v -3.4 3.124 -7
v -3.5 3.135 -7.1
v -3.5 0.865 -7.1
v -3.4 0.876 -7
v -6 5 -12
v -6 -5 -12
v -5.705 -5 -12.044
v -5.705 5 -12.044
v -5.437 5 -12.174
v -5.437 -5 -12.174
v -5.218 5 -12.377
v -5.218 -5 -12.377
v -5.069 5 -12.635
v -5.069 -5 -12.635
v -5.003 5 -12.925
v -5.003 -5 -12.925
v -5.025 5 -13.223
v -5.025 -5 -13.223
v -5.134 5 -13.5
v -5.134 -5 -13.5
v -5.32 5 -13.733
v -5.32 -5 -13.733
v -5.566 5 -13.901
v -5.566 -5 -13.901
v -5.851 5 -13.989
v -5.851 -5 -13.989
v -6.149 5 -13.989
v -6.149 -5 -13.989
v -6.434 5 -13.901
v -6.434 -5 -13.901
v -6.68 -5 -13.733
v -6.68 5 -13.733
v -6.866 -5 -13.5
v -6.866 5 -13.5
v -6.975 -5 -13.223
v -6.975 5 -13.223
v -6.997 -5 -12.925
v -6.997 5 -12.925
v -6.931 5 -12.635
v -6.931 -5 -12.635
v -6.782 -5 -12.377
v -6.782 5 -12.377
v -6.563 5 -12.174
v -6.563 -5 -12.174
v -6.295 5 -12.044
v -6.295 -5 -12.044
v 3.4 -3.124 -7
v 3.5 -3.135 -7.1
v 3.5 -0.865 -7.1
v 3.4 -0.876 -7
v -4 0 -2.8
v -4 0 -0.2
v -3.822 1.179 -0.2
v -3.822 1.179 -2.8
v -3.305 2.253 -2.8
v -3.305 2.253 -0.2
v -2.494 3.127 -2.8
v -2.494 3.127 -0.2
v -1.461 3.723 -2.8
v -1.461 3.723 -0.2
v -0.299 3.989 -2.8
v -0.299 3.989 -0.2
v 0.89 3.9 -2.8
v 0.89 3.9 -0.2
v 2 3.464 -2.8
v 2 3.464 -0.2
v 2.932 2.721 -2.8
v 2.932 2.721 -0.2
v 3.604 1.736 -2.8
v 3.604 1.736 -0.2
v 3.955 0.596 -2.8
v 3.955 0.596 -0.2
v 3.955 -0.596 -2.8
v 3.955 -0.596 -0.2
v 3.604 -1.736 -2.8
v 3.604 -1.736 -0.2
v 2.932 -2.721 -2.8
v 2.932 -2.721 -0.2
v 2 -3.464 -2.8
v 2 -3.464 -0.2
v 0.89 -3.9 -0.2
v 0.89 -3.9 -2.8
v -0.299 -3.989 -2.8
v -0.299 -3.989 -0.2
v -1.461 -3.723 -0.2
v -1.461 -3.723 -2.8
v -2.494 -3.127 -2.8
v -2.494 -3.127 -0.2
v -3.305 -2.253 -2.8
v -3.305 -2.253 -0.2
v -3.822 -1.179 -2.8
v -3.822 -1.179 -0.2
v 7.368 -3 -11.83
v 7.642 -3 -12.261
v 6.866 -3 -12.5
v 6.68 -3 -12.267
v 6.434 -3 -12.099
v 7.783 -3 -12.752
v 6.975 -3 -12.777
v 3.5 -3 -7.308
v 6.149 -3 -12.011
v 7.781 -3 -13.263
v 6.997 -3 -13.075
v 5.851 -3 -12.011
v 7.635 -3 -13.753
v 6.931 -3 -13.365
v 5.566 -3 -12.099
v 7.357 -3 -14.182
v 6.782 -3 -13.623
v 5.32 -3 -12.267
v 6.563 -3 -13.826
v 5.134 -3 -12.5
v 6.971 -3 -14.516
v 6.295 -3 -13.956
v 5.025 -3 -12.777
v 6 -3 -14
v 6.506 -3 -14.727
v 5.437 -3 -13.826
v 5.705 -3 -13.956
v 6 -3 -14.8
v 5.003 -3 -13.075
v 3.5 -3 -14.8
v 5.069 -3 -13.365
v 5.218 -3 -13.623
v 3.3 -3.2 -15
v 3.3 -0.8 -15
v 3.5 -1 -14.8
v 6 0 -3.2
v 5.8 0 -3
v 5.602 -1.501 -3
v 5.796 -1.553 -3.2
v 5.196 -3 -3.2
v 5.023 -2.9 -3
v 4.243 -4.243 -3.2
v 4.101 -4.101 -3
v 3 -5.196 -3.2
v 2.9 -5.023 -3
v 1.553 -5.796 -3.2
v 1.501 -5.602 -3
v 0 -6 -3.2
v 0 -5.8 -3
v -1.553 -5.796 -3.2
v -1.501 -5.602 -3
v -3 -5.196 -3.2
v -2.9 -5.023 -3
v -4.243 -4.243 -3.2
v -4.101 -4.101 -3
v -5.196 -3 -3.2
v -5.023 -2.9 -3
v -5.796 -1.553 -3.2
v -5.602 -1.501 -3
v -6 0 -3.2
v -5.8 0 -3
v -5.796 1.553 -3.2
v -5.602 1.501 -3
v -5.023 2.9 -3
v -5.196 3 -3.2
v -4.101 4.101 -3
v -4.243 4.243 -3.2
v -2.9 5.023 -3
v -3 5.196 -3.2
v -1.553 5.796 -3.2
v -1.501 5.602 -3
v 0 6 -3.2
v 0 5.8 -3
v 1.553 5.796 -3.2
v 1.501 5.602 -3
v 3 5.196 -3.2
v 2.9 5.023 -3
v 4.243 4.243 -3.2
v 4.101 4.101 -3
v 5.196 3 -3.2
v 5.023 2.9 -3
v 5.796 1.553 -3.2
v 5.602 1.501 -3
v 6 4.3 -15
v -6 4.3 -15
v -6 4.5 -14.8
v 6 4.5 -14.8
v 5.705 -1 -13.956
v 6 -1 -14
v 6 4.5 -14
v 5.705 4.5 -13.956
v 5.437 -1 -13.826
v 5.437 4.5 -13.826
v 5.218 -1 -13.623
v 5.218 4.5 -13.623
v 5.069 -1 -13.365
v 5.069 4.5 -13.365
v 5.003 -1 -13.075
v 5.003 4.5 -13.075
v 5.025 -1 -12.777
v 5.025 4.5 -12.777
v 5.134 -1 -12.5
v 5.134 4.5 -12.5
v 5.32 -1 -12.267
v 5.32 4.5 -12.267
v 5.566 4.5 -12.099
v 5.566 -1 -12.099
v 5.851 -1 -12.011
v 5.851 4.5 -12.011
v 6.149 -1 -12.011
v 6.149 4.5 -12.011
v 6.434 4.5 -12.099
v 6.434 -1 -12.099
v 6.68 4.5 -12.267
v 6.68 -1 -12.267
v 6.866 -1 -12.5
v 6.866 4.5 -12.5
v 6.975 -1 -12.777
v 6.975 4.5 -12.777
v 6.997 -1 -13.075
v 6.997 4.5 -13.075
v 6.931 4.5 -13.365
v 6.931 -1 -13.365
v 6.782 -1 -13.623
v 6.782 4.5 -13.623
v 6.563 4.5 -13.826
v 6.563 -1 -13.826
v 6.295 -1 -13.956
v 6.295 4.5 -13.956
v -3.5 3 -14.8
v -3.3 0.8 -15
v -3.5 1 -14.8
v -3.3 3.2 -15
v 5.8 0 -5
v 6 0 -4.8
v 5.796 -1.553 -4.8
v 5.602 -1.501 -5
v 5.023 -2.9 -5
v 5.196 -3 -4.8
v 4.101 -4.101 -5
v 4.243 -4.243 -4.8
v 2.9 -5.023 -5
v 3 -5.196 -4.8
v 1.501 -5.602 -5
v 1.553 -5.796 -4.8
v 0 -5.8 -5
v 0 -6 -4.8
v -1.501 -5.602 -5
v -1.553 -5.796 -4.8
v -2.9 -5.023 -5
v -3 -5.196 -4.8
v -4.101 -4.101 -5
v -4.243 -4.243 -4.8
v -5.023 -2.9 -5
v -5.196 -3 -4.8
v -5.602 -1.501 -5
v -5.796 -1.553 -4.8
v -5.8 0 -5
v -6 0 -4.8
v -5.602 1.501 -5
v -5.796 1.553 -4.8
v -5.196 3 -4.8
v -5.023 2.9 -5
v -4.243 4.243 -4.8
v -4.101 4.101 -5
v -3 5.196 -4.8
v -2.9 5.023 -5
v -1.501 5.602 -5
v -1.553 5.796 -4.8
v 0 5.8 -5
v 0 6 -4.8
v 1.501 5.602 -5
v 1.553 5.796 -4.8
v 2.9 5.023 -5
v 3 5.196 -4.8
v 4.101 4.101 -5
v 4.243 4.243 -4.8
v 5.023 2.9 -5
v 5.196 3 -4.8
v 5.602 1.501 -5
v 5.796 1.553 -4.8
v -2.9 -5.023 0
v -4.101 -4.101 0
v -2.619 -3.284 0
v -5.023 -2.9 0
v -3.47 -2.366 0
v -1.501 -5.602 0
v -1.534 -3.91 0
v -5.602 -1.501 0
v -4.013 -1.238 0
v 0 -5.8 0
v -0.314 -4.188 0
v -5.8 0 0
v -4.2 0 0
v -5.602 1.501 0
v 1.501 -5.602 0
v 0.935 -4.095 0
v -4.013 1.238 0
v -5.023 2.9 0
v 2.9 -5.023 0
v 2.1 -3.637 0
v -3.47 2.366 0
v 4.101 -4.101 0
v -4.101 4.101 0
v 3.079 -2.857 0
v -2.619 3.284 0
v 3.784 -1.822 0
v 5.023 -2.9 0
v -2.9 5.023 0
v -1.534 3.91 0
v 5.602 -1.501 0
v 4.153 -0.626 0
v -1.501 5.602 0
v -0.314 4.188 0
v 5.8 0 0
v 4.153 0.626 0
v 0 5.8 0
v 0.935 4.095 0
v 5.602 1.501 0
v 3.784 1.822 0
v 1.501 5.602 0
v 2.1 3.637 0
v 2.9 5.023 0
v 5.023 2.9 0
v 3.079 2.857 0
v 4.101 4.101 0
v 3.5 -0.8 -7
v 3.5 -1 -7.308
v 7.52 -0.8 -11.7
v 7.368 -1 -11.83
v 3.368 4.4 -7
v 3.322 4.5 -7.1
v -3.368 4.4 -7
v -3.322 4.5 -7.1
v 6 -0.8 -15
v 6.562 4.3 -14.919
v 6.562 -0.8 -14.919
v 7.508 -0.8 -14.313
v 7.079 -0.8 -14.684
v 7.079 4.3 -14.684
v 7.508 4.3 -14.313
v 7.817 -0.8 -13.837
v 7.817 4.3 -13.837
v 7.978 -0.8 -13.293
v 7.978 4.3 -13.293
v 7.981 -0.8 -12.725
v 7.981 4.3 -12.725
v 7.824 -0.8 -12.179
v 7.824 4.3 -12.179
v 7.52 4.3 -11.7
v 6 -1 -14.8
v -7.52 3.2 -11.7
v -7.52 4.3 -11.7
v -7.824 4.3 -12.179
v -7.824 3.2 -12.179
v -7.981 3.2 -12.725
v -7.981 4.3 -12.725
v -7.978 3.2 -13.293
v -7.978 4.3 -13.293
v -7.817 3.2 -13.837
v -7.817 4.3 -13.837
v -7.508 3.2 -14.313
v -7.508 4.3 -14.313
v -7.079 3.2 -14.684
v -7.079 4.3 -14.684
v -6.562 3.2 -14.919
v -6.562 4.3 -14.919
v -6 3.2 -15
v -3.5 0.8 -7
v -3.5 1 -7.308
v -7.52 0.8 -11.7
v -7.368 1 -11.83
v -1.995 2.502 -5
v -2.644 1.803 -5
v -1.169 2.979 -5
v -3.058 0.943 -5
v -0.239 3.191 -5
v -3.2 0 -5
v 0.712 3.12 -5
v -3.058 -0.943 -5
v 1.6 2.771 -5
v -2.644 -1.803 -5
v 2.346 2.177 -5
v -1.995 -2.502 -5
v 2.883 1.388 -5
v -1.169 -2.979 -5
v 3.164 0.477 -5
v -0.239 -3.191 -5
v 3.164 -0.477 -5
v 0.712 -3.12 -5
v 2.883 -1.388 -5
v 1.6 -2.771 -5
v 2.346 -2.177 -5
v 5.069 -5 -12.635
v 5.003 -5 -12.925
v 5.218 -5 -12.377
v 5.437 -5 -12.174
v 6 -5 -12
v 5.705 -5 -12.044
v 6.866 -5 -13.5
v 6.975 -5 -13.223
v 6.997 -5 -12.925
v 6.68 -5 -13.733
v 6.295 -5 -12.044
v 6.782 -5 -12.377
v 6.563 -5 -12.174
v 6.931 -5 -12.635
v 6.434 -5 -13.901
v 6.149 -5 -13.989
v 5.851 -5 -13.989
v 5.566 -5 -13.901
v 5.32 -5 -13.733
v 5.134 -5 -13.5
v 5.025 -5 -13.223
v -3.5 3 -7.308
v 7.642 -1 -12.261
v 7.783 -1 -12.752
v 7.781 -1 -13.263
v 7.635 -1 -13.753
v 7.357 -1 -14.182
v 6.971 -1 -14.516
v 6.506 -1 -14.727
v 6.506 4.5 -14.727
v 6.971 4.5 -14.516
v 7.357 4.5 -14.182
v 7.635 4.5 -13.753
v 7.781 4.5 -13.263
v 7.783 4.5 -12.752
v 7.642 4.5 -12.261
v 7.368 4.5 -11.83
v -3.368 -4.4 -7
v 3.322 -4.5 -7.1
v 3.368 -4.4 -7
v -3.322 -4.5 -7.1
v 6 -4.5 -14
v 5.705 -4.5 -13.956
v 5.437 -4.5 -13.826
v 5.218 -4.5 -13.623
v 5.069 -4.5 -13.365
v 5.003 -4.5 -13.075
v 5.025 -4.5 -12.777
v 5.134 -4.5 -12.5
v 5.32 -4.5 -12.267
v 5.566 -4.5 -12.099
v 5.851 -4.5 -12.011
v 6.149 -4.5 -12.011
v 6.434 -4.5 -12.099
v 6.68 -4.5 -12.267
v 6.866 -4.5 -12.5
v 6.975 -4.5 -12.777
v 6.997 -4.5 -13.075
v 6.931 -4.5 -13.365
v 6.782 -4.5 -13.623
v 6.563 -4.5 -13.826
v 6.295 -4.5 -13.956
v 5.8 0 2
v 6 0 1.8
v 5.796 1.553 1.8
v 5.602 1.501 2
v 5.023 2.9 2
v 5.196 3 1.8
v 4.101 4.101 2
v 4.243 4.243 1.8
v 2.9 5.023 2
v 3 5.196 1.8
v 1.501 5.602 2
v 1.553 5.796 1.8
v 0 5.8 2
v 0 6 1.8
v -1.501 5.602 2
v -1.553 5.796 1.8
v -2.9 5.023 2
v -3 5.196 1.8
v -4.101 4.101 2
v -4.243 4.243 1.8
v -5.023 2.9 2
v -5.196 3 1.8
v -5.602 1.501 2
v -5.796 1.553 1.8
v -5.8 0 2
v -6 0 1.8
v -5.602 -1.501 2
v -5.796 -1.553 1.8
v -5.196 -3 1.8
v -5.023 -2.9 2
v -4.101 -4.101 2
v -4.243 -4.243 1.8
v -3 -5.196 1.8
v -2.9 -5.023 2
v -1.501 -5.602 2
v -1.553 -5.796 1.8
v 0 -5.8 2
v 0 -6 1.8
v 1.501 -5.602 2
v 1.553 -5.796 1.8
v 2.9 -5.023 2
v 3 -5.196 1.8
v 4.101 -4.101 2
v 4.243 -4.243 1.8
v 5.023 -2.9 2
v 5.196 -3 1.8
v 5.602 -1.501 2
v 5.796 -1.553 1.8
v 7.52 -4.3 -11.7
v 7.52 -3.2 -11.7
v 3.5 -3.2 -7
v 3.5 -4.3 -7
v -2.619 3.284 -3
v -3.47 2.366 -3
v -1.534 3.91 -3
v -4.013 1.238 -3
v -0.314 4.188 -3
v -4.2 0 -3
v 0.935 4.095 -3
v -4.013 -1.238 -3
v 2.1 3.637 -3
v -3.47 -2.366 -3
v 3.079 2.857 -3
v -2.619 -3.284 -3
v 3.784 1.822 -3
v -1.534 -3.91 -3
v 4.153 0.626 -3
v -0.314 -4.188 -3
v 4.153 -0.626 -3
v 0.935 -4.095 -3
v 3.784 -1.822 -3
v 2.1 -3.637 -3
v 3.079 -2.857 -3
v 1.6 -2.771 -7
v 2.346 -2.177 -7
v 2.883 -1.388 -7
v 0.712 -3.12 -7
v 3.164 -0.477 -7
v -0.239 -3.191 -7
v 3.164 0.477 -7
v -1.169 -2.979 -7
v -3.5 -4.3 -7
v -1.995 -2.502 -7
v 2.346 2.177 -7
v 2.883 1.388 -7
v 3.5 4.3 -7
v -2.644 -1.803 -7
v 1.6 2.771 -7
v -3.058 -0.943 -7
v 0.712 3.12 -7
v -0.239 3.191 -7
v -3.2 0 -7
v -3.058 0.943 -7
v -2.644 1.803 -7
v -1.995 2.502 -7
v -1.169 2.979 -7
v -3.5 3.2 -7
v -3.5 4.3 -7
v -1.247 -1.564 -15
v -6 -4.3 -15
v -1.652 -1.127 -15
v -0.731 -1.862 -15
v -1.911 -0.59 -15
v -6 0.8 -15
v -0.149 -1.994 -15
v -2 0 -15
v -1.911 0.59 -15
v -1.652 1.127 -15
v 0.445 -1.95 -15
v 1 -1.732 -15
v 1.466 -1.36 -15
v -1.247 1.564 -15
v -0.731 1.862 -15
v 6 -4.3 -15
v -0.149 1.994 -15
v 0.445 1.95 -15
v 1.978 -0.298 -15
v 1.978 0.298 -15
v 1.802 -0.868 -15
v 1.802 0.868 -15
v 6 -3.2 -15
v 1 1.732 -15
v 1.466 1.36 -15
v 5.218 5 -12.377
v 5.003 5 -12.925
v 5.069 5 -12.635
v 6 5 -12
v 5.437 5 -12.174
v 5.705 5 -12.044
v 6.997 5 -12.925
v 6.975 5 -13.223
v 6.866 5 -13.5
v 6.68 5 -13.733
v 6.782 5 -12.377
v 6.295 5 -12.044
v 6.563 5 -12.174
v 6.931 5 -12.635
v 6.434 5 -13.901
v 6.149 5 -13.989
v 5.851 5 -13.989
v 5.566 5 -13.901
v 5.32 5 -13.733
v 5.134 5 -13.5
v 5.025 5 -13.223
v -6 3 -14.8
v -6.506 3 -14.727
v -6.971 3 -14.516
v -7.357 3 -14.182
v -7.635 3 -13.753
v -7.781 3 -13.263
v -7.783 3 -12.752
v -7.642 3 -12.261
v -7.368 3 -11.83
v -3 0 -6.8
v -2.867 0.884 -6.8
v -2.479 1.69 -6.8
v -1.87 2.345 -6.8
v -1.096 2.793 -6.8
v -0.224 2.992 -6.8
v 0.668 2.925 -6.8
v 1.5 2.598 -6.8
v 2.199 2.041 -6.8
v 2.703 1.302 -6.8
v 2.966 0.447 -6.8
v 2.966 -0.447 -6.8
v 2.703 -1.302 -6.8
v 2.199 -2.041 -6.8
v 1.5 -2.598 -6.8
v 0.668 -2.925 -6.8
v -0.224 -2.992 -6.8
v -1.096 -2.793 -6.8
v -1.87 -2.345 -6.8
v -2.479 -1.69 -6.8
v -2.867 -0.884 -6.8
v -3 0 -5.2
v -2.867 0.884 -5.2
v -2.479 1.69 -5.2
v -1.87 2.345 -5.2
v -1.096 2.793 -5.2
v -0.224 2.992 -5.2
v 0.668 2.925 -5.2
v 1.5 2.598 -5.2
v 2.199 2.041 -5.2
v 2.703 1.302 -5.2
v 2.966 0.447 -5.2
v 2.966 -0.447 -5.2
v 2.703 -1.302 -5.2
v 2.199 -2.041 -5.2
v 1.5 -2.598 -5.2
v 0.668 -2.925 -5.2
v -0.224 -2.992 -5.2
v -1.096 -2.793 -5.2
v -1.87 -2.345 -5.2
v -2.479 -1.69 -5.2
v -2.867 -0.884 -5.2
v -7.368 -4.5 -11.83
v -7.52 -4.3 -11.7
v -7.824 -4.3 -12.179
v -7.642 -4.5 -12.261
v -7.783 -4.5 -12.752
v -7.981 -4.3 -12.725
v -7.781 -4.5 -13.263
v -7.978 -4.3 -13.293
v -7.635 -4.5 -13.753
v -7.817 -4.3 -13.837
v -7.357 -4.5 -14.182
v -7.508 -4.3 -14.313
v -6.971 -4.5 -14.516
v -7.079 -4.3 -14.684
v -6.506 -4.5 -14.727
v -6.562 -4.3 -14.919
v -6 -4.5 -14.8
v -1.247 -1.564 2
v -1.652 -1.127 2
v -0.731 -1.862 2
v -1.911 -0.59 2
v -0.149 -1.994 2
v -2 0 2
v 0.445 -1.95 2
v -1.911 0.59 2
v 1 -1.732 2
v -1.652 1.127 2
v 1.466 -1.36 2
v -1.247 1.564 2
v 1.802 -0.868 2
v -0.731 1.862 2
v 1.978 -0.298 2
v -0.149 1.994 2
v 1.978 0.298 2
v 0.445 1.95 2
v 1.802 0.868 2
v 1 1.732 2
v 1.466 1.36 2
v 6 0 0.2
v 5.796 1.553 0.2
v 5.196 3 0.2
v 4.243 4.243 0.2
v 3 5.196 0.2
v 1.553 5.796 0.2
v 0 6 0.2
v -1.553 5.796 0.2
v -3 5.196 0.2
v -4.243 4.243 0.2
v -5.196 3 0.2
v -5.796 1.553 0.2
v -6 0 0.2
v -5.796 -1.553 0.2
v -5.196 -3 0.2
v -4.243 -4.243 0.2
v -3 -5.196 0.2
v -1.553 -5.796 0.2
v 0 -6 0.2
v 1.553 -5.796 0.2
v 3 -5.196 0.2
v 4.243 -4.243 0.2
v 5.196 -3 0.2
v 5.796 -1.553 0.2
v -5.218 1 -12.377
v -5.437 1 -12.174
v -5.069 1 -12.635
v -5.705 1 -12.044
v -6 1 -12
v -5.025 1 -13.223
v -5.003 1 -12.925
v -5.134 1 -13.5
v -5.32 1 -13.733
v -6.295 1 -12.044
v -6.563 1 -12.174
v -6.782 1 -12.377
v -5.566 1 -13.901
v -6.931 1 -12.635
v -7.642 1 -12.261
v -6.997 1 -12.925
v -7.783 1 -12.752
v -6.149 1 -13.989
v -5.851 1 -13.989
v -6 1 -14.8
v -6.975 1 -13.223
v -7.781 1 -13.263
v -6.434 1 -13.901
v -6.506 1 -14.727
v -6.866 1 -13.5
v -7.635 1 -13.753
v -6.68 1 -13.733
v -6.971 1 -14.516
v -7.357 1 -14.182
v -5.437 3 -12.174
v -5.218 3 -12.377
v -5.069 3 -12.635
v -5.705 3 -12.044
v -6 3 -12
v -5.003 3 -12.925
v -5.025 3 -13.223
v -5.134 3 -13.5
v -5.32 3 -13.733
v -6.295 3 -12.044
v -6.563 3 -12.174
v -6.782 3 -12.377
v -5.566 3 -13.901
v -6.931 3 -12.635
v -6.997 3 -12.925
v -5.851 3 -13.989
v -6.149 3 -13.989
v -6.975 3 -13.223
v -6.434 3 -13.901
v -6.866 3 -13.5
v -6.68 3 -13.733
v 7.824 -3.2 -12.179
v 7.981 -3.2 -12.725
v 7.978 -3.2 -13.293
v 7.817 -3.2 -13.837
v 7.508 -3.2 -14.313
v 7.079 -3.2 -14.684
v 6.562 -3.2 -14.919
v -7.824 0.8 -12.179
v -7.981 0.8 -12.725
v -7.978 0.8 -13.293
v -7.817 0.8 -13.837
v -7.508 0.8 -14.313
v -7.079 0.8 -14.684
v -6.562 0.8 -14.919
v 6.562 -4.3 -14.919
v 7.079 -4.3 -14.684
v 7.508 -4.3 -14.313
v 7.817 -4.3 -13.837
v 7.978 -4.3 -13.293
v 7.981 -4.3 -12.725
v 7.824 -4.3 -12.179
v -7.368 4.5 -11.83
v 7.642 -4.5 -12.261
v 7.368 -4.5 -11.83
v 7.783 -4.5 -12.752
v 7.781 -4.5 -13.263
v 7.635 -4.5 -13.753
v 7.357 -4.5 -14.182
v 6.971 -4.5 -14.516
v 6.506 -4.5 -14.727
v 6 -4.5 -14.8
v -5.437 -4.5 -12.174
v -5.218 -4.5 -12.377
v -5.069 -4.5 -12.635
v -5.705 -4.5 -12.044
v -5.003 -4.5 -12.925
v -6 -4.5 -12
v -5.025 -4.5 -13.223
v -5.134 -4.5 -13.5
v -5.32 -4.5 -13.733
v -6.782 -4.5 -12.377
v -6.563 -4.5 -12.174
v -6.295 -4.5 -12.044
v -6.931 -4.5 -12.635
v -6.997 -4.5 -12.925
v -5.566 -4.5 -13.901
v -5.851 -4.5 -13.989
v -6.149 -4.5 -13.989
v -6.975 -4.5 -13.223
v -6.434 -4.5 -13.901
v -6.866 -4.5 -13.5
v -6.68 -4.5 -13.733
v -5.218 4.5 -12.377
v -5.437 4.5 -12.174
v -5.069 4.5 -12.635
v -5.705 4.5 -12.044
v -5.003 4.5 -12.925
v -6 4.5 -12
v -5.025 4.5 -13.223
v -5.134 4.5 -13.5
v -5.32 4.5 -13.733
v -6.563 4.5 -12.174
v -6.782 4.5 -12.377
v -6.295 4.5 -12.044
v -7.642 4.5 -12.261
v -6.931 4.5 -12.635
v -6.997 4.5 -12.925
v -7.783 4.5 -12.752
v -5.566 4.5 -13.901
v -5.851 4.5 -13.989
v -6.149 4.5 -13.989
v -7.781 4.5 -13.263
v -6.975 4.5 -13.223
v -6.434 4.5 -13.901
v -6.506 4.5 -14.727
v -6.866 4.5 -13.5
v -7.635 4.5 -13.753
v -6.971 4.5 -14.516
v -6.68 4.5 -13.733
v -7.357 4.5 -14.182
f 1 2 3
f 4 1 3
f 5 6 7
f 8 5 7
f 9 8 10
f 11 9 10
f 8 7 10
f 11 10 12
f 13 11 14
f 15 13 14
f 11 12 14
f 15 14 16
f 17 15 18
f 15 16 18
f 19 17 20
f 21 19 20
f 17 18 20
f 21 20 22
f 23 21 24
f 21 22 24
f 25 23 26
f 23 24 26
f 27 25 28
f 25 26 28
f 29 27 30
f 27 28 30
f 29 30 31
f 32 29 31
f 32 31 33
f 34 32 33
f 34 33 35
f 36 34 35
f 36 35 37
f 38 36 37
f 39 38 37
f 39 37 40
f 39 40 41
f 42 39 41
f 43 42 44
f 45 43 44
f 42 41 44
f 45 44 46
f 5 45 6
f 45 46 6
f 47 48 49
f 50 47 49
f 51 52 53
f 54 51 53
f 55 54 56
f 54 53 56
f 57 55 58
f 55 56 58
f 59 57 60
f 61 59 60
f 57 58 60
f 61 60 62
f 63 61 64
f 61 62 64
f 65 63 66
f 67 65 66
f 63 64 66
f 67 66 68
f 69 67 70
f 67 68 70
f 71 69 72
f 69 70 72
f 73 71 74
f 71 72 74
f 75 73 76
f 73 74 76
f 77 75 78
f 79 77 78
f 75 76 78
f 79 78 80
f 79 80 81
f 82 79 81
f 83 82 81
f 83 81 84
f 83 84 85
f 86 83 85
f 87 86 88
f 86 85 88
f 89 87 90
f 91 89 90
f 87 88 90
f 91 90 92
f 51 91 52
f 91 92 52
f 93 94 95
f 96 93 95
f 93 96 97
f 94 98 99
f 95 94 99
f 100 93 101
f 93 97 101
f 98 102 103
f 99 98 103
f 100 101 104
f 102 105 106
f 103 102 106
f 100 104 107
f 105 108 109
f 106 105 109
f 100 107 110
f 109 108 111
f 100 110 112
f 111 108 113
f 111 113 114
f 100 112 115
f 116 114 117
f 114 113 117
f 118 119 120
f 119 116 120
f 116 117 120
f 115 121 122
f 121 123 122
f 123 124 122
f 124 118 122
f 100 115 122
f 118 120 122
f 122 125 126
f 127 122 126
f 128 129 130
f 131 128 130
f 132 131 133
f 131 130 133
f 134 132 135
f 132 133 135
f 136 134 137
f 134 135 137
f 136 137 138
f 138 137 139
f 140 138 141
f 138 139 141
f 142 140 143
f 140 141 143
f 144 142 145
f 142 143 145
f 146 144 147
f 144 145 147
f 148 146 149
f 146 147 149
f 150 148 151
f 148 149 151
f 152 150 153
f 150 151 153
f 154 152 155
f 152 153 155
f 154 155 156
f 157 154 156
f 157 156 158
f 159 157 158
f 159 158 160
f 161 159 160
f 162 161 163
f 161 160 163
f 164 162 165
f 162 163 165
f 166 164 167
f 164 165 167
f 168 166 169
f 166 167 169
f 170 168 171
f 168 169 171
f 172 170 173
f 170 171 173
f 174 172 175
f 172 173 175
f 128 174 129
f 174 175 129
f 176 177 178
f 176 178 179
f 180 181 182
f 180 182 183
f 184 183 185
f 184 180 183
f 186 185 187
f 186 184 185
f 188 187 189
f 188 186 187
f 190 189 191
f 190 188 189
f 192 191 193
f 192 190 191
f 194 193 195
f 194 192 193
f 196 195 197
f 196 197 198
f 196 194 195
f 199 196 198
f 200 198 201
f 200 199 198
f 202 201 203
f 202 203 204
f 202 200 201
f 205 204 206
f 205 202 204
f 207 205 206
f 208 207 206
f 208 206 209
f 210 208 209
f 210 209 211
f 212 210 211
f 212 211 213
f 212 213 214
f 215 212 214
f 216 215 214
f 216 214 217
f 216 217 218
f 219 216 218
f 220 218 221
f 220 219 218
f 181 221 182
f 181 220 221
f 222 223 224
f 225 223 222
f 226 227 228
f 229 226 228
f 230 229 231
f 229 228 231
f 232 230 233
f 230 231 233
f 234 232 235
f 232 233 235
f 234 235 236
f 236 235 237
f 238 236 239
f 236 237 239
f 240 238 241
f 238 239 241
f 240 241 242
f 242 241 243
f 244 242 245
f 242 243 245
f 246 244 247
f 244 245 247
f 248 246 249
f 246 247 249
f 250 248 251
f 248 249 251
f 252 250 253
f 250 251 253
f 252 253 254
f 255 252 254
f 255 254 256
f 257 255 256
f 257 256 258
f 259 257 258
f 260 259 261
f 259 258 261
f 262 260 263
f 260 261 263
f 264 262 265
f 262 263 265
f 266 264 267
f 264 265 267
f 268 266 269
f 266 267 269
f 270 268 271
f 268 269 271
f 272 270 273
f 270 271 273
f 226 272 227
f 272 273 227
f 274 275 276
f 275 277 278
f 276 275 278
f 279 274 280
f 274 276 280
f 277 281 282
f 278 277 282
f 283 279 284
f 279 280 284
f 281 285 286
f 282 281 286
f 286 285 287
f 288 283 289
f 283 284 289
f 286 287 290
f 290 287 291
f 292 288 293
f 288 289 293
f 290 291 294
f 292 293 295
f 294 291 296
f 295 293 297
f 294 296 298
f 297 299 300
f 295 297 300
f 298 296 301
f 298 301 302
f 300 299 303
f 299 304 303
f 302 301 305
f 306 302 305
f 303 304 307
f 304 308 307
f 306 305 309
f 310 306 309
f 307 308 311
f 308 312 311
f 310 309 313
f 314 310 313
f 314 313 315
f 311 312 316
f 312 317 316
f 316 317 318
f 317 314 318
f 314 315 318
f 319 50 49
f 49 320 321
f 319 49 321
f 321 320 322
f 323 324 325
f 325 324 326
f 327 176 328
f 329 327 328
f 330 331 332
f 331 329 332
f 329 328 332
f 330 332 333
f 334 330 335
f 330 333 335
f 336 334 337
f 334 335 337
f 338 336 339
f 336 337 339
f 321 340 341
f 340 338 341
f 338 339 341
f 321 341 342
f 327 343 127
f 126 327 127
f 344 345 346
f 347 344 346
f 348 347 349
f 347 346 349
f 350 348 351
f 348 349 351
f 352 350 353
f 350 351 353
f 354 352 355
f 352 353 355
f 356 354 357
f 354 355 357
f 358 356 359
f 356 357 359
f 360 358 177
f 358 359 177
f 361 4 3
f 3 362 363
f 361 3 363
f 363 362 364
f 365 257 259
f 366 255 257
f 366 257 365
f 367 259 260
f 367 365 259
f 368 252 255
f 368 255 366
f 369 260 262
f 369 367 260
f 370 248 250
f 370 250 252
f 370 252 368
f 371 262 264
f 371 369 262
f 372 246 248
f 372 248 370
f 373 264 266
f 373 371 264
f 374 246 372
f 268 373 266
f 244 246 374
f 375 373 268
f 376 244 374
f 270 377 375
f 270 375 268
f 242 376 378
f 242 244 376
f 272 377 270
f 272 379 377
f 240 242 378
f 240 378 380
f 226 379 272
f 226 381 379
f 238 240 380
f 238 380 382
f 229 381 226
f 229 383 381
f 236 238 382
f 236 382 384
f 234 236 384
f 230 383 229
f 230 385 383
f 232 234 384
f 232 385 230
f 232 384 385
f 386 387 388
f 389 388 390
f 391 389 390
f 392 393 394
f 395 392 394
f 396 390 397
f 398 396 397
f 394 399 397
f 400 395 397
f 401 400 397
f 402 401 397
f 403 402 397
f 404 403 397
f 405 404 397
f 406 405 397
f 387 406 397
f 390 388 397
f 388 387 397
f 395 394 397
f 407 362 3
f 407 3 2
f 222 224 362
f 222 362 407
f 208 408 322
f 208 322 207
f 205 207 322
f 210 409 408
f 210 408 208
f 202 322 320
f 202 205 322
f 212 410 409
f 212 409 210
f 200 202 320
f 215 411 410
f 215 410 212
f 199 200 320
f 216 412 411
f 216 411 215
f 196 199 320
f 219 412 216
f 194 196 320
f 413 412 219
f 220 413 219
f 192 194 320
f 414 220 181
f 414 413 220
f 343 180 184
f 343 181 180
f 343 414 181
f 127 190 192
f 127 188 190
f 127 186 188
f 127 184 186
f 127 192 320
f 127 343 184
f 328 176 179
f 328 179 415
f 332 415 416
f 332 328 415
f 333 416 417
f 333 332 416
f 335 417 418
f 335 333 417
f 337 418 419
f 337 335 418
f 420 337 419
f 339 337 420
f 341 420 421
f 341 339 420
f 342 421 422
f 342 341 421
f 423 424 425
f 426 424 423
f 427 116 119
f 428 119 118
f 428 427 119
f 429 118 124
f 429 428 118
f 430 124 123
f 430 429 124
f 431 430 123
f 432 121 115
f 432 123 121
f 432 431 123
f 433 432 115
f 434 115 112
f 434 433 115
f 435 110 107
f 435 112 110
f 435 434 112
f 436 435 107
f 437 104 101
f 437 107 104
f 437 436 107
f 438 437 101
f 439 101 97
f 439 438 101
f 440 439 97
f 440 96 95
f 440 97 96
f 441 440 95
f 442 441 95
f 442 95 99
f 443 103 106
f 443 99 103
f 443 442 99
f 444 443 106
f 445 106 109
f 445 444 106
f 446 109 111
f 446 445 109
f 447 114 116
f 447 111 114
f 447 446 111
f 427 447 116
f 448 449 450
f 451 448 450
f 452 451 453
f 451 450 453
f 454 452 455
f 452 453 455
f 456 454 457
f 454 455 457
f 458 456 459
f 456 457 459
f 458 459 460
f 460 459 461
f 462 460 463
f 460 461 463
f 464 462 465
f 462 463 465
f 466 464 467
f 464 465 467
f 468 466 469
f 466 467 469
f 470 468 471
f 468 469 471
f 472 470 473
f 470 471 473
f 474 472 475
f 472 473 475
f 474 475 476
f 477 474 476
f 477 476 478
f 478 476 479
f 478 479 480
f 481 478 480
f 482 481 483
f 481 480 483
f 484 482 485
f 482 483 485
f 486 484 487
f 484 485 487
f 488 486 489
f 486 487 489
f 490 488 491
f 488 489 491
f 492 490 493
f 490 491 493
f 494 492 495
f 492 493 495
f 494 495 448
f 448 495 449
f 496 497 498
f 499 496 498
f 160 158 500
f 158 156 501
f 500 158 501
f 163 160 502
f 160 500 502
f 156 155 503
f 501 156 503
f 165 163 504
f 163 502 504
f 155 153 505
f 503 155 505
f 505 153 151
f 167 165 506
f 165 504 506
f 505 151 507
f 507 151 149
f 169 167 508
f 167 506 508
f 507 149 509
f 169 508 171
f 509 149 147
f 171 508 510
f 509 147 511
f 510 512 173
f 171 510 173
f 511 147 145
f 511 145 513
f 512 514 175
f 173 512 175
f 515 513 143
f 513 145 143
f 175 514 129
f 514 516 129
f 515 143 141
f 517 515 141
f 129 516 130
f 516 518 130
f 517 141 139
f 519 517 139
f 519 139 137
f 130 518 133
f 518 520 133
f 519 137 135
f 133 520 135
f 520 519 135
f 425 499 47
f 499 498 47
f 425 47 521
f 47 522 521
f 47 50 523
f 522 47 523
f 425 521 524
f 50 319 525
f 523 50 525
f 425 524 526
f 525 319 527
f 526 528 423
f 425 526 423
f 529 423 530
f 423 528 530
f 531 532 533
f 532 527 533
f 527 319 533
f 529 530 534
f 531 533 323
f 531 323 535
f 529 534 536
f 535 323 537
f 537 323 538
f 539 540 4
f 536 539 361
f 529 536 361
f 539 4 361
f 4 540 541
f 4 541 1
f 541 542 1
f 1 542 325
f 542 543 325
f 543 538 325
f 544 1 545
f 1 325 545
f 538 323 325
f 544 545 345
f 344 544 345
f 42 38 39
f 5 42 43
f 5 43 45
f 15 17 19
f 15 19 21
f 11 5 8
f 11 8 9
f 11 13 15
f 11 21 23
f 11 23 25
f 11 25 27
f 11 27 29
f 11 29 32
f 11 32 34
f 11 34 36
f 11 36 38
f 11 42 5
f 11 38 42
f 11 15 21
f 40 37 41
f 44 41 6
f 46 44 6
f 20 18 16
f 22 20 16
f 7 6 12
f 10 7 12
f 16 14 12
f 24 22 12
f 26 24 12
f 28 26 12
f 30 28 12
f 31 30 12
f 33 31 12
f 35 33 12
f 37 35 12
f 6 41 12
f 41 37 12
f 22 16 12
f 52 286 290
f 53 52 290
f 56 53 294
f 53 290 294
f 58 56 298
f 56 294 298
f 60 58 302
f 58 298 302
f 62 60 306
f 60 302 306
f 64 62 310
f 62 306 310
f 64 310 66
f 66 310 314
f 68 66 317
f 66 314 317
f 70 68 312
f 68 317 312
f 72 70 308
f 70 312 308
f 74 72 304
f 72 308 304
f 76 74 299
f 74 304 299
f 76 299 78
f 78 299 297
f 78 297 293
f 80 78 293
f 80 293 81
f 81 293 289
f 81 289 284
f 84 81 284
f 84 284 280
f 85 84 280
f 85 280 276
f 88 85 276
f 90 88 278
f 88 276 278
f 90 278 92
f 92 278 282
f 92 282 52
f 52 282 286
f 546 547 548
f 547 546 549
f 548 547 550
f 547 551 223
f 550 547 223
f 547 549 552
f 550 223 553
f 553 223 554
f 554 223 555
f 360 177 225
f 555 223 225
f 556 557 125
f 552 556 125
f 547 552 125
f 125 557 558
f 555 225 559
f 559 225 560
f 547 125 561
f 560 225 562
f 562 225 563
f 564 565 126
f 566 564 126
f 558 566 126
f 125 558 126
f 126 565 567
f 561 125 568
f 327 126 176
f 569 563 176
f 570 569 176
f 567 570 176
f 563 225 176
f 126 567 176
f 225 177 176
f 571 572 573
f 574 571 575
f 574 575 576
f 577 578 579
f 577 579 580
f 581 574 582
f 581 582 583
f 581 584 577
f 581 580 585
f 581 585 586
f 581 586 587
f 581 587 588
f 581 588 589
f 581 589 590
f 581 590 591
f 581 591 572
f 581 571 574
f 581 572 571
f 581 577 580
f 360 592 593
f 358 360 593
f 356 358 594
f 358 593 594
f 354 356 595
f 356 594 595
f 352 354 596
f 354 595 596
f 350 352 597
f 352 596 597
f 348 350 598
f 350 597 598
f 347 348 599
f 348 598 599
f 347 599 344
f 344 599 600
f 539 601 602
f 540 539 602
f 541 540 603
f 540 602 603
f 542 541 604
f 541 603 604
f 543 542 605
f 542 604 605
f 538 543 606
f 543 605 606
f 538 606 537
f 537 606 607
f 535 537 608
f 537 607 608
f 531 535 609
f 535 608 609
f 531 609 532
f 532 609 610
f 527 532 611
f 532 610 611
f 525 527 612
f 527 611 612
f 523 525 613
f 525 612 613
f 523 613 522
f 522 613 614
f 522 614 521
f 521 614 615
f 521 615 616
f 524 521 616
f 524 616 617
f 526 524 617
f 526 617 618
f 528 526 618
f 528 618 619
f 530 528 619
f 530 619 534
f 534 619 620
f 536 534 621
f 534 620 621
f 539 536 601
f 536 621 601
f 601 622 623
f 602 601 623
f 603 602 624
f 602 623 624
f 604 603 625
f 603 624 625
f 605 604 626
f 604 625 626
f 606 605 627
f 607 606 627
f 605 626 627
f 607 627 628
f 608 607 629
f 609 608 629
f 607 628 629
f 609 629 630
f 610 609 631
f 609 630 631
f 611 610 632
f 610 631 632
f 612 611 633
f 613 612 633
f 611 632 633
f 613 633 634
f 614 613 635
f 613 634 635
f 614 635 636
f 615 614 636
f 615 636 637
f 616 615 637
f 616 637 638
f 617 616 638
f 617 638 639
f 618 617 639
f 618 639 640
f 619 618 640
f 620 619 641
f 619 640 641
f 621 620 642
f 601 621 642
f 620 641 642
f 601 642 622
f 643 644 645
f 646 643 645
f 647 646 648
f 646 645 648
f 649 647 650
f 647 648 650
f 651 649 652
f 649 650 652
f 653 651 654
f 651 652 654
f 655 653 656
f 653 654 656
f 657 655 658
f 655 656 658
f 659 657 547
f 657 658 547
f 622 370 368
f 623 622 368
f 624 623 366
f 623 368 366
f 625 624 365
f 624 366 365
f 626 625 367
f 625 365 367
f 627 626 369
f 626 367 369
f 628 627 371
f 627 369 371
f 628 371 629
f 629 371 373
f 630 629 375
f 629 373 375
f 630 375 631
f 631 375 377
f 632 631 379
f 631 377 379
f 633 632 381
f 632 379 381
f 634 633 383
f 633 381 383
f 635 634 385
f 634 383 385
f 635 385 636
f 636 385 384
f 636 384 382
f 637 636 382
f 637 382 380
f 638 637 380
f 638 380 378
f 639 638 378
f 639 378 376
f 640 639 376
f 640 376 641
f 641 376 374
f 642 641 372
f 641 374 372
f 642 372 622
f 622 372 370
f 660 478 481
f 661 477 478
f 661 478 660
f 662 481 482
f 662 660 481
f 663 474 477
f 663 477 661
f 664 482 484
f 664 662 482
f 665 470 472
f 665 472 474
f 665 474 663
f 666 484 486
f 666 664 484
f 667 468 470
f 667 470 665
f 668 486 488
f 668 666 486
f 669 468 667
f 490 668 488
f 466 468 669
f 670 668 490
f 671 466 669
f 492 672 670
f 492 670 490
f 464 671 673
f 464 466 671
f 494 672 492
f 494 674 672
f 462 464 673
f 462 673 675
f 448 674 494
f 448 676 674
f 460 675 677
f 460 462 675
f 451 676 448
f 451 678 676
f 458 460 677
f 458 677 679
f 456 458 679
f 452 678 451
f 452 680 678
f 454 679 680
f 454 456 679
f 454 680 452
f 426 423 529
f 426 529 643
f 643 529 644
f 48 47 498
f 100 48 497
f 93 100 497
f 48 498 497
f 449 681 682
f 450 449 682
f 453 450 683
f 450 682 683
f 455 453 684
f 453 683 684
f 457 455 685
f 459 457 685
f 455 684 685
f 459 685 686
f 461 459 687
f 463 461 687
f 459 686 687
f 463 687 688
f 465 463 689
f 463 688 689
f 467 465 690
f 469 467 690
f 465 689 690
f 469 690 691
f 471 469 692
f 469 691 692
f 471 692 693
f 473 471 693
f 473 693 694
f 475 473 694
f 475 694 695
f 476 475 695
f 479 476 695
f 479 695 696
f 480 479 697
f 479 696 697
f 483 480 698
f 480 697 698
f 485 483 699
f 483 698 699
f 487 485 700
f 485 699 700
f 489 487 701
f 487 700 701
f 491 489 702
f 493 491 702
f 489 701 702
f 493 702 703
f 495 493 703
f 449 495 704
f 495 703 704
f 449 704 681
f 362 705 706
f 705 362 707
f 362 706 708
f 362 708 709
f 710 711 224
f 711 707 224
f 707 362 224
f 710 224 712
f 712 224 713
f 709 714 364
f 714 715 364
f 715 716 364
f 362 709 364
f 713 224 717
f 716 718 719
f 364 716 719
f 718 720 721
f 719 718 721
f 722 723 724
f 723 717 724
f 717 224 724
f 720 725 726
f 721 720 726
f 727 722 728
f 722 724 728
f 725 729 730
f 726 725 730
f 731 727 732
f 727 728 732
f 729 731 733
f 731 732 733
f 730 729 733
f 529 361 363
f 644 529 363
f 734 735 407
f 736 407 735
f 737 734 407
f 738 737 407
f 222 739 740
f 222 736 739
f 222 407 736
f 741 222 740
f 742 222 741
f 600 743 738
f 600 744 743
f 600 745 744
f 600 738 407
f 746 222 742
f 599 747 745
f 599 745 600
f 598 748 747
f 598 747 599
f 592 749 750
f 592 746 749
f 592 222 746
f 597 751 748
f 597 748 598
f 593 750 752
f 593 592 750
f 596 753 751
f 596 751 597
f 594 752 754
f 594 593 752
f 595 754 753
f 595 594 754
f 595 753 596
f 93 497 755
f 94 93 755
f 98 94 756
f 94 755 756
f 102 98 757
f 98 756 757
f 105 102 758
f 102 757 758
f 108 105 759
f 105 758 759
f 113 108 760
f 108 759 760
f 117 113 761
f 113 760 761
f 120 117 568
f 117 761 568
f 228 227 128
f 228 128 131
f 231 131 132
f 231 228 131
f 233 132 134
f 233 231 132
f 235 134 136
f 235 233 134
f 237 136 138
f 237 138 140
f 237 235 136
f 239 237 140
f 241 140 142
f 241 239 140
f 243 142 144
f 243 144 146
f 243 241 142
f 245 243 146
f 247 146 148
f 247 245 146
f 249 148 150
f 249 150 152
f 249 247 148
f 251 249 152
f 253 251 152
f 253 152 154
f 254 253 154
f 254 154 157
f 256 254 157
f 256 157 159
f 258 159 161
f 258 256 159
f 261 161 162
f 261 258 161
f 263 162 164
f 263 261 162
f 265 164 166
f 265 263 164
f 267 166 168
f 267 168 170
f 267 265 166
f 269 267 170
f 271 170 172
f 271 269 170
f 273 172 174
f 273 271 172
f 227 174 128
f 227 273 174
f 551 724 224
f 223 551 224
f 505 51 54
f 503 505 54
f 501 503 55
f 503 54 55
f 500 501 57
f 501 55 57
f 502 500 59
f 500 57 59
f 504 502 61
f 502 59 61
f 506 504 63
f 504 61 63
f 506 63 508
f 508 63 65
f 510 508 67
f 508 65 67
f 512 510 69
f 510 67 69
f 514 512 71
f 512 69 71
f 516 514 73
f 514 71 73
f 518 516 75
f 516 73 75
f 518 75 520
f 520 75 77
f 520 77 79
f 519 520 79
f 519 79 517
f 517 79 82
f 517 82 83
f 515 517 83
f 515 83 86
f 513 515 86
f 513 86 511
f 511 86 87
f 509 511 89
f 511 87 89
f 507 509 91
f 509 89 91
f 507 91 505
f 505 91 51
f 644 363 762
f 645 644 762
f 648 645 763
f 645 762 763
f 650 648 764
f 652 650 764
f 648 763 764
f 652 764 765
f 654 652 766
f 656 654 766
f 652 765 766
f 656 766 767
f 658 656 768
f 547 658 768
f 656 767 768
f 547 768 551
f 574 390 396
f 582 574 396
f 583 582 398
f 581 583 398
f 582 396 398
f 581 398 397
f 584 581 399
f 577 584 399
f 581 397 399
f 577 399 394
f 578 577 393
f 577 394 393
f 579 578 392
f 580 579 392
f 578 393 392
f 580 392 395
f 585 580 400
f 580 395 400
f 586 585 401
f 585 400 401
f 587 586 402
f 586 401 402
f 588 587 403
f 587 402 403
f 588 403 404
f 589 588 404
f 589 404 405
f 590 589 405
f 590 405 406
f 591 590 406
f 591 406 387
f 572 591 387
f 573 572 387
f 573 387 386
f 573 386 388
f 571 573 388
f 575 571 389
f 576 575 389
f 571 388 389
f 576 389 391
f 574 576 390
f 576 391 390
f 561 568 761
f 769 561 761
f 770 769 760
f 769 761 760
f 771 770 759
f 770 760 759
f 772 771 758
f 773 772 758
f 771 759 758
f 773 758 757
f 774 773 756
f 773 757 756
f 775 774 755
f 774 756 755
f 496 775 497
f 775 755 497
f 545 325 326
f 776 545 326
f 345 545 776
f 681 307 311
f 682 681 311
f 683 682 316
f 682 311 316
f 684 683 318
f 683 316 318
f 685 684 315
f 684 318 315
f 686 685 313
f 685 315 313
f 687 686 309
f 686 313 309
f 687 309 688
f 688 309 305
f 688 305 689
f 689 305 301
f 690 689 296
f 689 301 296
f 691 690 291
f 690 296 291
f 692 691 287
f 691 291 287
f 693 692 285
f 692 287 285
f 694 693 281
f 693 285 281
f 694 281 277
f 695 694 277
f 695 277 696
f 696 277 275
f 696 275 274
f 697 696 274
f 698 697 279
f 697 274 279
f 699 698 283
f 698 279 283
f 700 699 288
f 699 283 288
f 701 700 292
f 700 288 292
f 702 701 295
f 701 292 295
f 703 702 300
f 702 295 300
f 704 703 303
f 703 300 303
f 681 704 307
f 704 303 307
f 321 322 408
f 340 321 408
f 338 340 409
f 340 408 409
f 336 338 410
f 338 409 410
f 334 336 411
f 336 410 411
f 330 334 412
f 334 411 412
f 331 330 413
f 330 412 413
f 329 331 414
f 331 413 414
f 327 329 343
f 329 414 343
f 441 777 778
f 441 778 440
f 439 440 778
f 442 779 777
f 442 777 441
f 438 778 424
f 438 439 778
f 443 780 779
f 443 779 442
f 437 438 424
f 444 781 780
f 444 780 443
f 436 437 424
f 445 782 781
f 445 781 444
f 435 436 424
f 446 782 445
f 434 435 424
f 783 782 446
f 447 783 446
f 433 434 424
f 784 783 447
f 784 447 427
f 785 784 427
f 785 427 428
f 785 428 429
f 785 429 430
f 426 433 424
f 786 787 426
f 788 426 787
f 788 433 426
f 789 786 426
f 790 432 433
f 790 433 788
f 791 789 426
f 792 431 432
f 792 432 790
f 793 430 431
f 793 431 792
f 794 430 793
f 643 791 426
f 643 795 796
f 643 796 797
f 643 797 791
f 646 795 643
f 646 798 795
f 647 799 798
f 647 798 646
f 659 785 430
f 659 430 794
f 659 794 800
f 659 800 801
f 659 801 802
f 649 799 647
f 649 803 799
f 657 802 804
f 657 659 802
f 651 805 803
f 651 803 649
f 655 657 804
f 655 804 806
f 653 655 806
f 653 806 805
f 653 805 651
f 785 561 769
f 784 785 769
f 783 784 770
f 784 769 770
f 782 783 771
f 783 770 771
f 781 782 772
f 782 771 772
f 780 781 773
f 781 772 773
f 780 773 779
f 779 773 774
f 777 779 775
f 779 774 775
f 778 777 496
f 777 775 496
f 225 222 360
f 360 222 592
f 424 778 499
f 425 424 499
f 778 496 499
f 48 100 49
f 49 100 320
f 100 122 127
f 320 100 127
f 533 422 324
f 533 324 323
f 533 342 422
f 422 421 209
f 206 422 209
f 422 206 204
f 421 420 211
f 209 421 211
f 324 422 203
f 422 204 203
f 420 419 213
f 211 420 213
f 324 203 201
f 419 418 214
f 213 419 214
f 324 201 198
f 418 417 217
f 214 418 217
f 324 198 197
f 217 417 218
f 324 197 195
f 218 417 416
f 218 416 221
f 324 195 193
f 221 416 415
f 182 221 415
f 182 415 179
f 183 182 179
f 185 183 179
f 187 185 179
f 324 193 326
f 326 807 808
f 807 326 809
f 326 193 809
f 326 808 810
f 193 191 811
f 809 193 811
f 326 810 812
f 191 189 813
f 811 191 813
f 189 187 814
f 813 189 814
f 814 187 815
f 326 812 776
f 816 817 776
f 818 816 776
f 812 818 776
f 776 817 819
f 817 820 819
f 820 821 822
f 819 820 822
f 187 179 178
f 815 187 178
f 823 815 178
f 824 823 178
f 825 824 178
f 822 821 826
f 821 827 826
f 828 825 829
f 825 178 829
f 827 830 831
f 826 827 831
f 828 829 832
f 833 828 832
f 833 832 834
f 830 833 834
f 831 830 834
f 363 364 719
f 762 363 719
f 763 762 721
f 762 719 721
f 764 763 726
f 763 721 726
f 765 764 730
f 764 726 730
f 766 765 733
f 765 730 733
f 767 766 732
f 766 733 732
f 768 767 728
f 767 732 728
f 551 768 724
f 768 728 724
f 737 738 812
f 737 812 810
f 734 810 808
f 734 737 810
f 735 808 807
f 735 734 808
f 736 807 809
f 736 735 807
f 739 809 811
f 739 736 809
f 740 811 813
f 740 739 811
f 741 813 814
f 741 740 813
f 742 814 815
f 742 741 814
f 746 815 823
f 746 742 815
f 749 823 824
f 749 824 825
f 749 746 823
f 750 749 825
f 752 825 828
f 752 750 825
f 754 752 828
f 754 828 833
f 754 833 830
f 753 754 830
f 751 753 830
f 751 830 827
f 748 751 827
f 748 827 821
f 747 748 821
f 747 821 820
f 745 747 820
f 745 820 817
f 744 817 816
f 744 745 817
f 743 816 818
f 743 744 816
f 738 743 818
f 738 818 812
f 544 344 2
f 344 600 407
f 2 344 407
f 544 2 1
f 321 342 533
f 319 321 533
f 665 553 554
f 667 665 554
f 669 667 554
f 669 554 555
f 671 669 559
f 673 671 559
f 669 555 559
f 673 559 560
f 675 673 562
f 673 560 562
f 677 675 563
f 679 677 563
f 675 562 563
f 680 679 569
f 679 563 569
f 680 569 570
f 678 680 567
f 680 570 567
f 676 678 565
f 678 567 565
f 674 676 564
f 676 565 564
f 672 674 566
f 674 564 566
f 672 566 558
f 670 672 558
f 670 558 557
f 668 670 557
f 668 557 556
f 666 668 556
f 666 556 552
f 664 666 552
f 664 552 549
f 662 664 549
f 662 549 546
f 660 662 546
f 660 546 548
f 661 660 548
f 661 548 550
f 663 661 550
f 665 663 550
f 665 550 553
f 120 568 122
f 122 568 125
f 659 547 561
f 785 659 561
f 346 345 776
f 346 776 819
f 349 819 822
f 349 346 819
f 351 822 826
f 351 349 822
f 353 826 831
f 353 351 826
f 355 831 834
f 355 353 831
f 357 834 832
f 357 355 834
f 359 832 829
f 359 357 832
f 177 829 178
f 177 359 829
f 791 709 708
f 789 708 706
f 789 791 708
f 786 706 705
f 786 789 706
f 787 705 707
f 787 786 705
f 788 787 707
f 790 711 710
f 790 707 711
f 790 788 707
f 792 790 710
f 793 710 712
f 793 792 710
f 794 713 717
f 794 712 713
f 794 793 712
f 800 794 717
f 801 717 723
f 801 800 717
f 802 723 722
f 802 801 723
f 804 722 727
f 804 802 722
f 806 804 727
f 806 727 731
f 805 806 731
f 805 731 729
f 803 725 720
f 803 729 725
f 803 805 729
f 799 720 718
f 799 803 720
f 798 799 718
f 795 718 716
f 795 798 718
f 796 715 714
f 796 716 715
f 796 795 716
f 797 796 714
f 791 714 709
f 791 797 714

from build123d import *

# Parameters (mm, degrees)
SKETCH1_R                = 6
BOSS_EXTRUDE1_DEPTH      = 2
SKETCH2_R                = 4
BOSS_EXTRUDE2_DEPTH      = 3
BOSS_EXTRUDE3_START      = 2
SKETCH3_R                = 6
BOSS_EXTRUDE3_DEPTH      = 2
SKETCH4_R                = 3
BOSS_EXTRUDE4_DEPTH      = 2
SKETCH5_R                = 1
BOSS_EXTRUDE5_DEPTH      = 4.5
CUT_EXTRUDE1_REACH       = 21.723
SKETCH6_W                = 4.5
SKETCH6_H                = 2
SKETCH7_R                = 2
CUT_EXTRUDE2_DEPTH       = 20.723082923
CHAMFER1_SIZE            = 0.2
CHAMFER2_SIZE            = 0.1
BOSS_EXTRUDE6_DEPTH      = 0.5
BOSS_EXTRUDE6_DEPTH_BACK = 9.5
SKETCH8_R                = 1
BOSS_EXTRUDE7_DEPTH      = 0.5
BOSS_EXTRUDE7_DEPTH_BACK = 9.5
SKETCH9_R                = 1


with BuildPart() as part:
    # Sketch1 → Boss-Extrude1 (new body)
    with BuildSketch(Plane.XY):
        Circle(SKETCH1_R)
    extrude(amount=BOSS_EXTRUDE1_DEPTH)

    # Sketch2 → Boss-Extrude2 (add)
    with BuildSketch(Plane(origin=(0, 0, 0), x_dir=(-1, 0, 0), z_dir=(0, 0, -1))):
        Circle(SKETCH2_R)
    extrude(amount=BOSS_EXTRUDE2_DEPTH)

    # Sketch3 → Boss-Extrude3 (add)
    with BuildSketch(Plane(origin=(0, 0, -3), x_dir=(-1, 0, 0), z_dir=(0, 0, -1)).offset(BOSS_EXTRUDE3_START)):
        with Locations(Location((0, 0, 0), (0, 0, 180))):
            Circle(SKETCH3_R)
    extrude(amount=-BOSS_EXTRUDE3_DEPTH)

    # Sketch4 → Boss-Extrude4 (add)
    with BuildSketch(Plane(origin=(0, 0, -5), x_dir=(-1, 0, 0), z_dir=(0, 0, -1))):
        Circle(SKETCH4_R)
    extrude(amount=BOSS_EXTRUDE4_DEPTH)

    # Sketch5 → Boss-Extrude5 (add, symmetric)
    with BuildSketch(Plane(origin=(0, 0, 0), x_dir=(1, 0, 0), z_dir=(0, 1, 0))):
        with BuildLine():
            Line((3.5, 7), (-3.5, 7))
            Line((-3.5, 7), (-7.519902988, 11.700040421))
            ThreePointArc((-7.519902988, 11.700040421), (-7.816579087, 13.836684183), (-6, 15))
            Line((-6, 15), (6, 15))
            ThreePointArc((6, 15), (7.816579087, 13.836684183), (7.519902988, 11.700040421))
            Line((7.519902988, 11.700040421), (3.5, 7))
        make_face()
        with Locations(Location((-6, 13, 0), (0, 0, 270))):
            Circle(SKETCH5_R, mode=Mode.SUBTRACT)
        with Locations(Location((6, 13, 0), (0, 0, 90))):
            Circle(SKETCH5_R, mode=Mode.SUBTRACT)
    extrude(amount=BOSS_EXTRUDE5_DEPTH, both=True)

    # Cut-Extrude1: up to this face of the body (flat: up to its plane)
    cut_extrude1_end = Plane(part.part.faces().sort_by_distance((3.385982457, 0, -7))[0])
    # Sketch6 → Cut-Extrude1 (cut, up to the picked face)
    with BuildSketch(Plane(origin=(0, 0, -15), x_dir=(-1, 0, 0), z_dir=(0, 0, -1)), mode=Mode.PRIVATE) as cut_extrude1_sk1:
        with Locations((-5.75, -2)):
            Rectangle(SKETCH6_W, SKETCH6_H)
    cut_extrude1_tool1 = split(extrude(cut_extrude1_sk1.sketch, amount=-CUT_EXTRUDE1_REACH, mode=Mode.PRIVATE), bisect_by=cut_extrude1_end, keep=Keep.BOTH, mode=Mode.PRIVATE)
    # Sketch6 → Cut-Extrude1 (cut, up to the picked face)
    with BuildSketch(Plane(origin=(0, 0, -15), x_dir=(-1, 0, 0), z_dir=(0, 0, -1)), mode=Mode.PRIVATE) as cut_extrude1_sk2:
        with Locations((5.75, 2)):
            Rectangle(SKETCH6_W, SKETCH6_H)
    cut_extrude1_tool2 = split(extrude(cut_extrude1_sk2.sketch, amount=-CUT_EXTRUDE1_REACH, mode=Mode.PRIVATE), bisect_by=cut_extrude1_end, keep=Keep.BOTH, mode=Mode.PRIVATE)
    add(cut_extrude1_tool1.solids().sort_by(Axis((5.75, -2, -15), (0, 0, 1)))[0], mode=Mode.SUBTRACT)
    add(cut_extrude1_tool2.solids().sort_by(Axis((-5.75, 2, -15), (0, 0, 1)))[0], mode=Mode.SUBTRACT)

    # Sketch7 → Cut-Extrude2 (cut, through all)
    with BuildSketch(Plane(origin=(0, 0, -15), x_dir=(-1, 0, 0), z_dir=(0, 0, -1))):
        Circle(SKETCH7_R)
    extrude(amount=-CUT_EXTRUDE2_DEPTH, mode=Mode.SUBTRACT)

    # Chamfer1
    chamfer1_edges = [part.edges().sort_by_distance(p)[0] for p in [
        (-6, 0, -3),
        (-6, 0, -5),
        (3, 0, -5),
        (3, 0, -7),
        (-5.509951494, 4.5, -9.350020211),
        (-6, 0, 0),
        (5.509951494, 4.5, -9.350020211),
        (7.816579087, 4.5, -13.836684183),
        (0, 4.5, -15),
        (-7.816579087, 4.5, -13.836684183),
        (-5.509951494, -4.5, -9.350020211),
        (5.509951494, -4.5, -9.350020211),
        (7.816579087, -4.5, -13.836684183),
        (0, -4.5, -15),
        (-7.816579087, -4.5, -13.836684183),
        (-6, 0, 2),
        (4.75, -1, -15),
        (4.75, -3, -15),
        (3.5, -2, -15),
        (5.509951494, -1, -9.350020211),
        (7.816579087, -1, -13.836684183),
        (7.816579087, -3, -13.836684183),
        (5.509951494, -3, -9.350020211),
        (4, 0, 0),
        (-5.509951494, 1, -9.350020211),
        (4, 0, -3),
        (-7.816579087, 1, -13.836684183),
        (-7.816579087, 3, -13.836684183),
        (-5.509951494, 3, -9.350020211),
        (-4.75, 3, -15),
        (-3.5, 2, -15),
        (-4.75, 1, -15),
    ]]
    chamfer(chamfer1_edges, length=CHAMFER1_SIZE)

    # Chamfer2
    chamfer2_edges = [part.edges().sort_by_distance(p)[0] for p in [
        (0, -4.5, -7),
        (0, 4.5, -7),
        (3.5, -2, -7),
        (-3.5, 2, -7),
    ]]
    chamfer(chamfer2_edges, length=CHAMFER2_SIZE)


with BuildPart() as body_2:
    # Sketch8 → Boss-Extrude6 (new, two sides: drawn at the far end of the back side and taken through both)
    with BuildSketch(Plane(origin=(0, 4.5, 0), x_dir=(1, 0, 0), z_dir=(0, 1, 0)).offset(-BOSS_EXTRUDE6_DEPTH_BACK)):
        with Locations(Location((-6, 13, 0), (0, 0, 270))):
            Circle(SKETCH8_R)
    extrude(amount=BOSS_EXTRUDE6_DEPTH + BOSS_EXTRUDE6_DEPTH_BACK)


with BuildPart() as body_3:
    # Sketch9 → Boss-Extrude7 (new, two sides: drawn at the far end of the back side and taken through both)
    with BuildSketch(Plane(origin=(0, 4.5, 0), x_dir=(1, 0, 0), z_dir=(0, 1, 0)).offset(-BOSS_EXTRUDE7_DEPTH_BACK)):
        with Locations(Location((6, 13, 0), (0, 0, 270))):
            Circle(SKETCH9_R)
    extrude(amount=BOSS_EXTRUDE7_DEPTH + BOSS_EXTRUDE7_DEPTH_BACK)


solid = Compound([part.part, body_2.part, body_3.part])
